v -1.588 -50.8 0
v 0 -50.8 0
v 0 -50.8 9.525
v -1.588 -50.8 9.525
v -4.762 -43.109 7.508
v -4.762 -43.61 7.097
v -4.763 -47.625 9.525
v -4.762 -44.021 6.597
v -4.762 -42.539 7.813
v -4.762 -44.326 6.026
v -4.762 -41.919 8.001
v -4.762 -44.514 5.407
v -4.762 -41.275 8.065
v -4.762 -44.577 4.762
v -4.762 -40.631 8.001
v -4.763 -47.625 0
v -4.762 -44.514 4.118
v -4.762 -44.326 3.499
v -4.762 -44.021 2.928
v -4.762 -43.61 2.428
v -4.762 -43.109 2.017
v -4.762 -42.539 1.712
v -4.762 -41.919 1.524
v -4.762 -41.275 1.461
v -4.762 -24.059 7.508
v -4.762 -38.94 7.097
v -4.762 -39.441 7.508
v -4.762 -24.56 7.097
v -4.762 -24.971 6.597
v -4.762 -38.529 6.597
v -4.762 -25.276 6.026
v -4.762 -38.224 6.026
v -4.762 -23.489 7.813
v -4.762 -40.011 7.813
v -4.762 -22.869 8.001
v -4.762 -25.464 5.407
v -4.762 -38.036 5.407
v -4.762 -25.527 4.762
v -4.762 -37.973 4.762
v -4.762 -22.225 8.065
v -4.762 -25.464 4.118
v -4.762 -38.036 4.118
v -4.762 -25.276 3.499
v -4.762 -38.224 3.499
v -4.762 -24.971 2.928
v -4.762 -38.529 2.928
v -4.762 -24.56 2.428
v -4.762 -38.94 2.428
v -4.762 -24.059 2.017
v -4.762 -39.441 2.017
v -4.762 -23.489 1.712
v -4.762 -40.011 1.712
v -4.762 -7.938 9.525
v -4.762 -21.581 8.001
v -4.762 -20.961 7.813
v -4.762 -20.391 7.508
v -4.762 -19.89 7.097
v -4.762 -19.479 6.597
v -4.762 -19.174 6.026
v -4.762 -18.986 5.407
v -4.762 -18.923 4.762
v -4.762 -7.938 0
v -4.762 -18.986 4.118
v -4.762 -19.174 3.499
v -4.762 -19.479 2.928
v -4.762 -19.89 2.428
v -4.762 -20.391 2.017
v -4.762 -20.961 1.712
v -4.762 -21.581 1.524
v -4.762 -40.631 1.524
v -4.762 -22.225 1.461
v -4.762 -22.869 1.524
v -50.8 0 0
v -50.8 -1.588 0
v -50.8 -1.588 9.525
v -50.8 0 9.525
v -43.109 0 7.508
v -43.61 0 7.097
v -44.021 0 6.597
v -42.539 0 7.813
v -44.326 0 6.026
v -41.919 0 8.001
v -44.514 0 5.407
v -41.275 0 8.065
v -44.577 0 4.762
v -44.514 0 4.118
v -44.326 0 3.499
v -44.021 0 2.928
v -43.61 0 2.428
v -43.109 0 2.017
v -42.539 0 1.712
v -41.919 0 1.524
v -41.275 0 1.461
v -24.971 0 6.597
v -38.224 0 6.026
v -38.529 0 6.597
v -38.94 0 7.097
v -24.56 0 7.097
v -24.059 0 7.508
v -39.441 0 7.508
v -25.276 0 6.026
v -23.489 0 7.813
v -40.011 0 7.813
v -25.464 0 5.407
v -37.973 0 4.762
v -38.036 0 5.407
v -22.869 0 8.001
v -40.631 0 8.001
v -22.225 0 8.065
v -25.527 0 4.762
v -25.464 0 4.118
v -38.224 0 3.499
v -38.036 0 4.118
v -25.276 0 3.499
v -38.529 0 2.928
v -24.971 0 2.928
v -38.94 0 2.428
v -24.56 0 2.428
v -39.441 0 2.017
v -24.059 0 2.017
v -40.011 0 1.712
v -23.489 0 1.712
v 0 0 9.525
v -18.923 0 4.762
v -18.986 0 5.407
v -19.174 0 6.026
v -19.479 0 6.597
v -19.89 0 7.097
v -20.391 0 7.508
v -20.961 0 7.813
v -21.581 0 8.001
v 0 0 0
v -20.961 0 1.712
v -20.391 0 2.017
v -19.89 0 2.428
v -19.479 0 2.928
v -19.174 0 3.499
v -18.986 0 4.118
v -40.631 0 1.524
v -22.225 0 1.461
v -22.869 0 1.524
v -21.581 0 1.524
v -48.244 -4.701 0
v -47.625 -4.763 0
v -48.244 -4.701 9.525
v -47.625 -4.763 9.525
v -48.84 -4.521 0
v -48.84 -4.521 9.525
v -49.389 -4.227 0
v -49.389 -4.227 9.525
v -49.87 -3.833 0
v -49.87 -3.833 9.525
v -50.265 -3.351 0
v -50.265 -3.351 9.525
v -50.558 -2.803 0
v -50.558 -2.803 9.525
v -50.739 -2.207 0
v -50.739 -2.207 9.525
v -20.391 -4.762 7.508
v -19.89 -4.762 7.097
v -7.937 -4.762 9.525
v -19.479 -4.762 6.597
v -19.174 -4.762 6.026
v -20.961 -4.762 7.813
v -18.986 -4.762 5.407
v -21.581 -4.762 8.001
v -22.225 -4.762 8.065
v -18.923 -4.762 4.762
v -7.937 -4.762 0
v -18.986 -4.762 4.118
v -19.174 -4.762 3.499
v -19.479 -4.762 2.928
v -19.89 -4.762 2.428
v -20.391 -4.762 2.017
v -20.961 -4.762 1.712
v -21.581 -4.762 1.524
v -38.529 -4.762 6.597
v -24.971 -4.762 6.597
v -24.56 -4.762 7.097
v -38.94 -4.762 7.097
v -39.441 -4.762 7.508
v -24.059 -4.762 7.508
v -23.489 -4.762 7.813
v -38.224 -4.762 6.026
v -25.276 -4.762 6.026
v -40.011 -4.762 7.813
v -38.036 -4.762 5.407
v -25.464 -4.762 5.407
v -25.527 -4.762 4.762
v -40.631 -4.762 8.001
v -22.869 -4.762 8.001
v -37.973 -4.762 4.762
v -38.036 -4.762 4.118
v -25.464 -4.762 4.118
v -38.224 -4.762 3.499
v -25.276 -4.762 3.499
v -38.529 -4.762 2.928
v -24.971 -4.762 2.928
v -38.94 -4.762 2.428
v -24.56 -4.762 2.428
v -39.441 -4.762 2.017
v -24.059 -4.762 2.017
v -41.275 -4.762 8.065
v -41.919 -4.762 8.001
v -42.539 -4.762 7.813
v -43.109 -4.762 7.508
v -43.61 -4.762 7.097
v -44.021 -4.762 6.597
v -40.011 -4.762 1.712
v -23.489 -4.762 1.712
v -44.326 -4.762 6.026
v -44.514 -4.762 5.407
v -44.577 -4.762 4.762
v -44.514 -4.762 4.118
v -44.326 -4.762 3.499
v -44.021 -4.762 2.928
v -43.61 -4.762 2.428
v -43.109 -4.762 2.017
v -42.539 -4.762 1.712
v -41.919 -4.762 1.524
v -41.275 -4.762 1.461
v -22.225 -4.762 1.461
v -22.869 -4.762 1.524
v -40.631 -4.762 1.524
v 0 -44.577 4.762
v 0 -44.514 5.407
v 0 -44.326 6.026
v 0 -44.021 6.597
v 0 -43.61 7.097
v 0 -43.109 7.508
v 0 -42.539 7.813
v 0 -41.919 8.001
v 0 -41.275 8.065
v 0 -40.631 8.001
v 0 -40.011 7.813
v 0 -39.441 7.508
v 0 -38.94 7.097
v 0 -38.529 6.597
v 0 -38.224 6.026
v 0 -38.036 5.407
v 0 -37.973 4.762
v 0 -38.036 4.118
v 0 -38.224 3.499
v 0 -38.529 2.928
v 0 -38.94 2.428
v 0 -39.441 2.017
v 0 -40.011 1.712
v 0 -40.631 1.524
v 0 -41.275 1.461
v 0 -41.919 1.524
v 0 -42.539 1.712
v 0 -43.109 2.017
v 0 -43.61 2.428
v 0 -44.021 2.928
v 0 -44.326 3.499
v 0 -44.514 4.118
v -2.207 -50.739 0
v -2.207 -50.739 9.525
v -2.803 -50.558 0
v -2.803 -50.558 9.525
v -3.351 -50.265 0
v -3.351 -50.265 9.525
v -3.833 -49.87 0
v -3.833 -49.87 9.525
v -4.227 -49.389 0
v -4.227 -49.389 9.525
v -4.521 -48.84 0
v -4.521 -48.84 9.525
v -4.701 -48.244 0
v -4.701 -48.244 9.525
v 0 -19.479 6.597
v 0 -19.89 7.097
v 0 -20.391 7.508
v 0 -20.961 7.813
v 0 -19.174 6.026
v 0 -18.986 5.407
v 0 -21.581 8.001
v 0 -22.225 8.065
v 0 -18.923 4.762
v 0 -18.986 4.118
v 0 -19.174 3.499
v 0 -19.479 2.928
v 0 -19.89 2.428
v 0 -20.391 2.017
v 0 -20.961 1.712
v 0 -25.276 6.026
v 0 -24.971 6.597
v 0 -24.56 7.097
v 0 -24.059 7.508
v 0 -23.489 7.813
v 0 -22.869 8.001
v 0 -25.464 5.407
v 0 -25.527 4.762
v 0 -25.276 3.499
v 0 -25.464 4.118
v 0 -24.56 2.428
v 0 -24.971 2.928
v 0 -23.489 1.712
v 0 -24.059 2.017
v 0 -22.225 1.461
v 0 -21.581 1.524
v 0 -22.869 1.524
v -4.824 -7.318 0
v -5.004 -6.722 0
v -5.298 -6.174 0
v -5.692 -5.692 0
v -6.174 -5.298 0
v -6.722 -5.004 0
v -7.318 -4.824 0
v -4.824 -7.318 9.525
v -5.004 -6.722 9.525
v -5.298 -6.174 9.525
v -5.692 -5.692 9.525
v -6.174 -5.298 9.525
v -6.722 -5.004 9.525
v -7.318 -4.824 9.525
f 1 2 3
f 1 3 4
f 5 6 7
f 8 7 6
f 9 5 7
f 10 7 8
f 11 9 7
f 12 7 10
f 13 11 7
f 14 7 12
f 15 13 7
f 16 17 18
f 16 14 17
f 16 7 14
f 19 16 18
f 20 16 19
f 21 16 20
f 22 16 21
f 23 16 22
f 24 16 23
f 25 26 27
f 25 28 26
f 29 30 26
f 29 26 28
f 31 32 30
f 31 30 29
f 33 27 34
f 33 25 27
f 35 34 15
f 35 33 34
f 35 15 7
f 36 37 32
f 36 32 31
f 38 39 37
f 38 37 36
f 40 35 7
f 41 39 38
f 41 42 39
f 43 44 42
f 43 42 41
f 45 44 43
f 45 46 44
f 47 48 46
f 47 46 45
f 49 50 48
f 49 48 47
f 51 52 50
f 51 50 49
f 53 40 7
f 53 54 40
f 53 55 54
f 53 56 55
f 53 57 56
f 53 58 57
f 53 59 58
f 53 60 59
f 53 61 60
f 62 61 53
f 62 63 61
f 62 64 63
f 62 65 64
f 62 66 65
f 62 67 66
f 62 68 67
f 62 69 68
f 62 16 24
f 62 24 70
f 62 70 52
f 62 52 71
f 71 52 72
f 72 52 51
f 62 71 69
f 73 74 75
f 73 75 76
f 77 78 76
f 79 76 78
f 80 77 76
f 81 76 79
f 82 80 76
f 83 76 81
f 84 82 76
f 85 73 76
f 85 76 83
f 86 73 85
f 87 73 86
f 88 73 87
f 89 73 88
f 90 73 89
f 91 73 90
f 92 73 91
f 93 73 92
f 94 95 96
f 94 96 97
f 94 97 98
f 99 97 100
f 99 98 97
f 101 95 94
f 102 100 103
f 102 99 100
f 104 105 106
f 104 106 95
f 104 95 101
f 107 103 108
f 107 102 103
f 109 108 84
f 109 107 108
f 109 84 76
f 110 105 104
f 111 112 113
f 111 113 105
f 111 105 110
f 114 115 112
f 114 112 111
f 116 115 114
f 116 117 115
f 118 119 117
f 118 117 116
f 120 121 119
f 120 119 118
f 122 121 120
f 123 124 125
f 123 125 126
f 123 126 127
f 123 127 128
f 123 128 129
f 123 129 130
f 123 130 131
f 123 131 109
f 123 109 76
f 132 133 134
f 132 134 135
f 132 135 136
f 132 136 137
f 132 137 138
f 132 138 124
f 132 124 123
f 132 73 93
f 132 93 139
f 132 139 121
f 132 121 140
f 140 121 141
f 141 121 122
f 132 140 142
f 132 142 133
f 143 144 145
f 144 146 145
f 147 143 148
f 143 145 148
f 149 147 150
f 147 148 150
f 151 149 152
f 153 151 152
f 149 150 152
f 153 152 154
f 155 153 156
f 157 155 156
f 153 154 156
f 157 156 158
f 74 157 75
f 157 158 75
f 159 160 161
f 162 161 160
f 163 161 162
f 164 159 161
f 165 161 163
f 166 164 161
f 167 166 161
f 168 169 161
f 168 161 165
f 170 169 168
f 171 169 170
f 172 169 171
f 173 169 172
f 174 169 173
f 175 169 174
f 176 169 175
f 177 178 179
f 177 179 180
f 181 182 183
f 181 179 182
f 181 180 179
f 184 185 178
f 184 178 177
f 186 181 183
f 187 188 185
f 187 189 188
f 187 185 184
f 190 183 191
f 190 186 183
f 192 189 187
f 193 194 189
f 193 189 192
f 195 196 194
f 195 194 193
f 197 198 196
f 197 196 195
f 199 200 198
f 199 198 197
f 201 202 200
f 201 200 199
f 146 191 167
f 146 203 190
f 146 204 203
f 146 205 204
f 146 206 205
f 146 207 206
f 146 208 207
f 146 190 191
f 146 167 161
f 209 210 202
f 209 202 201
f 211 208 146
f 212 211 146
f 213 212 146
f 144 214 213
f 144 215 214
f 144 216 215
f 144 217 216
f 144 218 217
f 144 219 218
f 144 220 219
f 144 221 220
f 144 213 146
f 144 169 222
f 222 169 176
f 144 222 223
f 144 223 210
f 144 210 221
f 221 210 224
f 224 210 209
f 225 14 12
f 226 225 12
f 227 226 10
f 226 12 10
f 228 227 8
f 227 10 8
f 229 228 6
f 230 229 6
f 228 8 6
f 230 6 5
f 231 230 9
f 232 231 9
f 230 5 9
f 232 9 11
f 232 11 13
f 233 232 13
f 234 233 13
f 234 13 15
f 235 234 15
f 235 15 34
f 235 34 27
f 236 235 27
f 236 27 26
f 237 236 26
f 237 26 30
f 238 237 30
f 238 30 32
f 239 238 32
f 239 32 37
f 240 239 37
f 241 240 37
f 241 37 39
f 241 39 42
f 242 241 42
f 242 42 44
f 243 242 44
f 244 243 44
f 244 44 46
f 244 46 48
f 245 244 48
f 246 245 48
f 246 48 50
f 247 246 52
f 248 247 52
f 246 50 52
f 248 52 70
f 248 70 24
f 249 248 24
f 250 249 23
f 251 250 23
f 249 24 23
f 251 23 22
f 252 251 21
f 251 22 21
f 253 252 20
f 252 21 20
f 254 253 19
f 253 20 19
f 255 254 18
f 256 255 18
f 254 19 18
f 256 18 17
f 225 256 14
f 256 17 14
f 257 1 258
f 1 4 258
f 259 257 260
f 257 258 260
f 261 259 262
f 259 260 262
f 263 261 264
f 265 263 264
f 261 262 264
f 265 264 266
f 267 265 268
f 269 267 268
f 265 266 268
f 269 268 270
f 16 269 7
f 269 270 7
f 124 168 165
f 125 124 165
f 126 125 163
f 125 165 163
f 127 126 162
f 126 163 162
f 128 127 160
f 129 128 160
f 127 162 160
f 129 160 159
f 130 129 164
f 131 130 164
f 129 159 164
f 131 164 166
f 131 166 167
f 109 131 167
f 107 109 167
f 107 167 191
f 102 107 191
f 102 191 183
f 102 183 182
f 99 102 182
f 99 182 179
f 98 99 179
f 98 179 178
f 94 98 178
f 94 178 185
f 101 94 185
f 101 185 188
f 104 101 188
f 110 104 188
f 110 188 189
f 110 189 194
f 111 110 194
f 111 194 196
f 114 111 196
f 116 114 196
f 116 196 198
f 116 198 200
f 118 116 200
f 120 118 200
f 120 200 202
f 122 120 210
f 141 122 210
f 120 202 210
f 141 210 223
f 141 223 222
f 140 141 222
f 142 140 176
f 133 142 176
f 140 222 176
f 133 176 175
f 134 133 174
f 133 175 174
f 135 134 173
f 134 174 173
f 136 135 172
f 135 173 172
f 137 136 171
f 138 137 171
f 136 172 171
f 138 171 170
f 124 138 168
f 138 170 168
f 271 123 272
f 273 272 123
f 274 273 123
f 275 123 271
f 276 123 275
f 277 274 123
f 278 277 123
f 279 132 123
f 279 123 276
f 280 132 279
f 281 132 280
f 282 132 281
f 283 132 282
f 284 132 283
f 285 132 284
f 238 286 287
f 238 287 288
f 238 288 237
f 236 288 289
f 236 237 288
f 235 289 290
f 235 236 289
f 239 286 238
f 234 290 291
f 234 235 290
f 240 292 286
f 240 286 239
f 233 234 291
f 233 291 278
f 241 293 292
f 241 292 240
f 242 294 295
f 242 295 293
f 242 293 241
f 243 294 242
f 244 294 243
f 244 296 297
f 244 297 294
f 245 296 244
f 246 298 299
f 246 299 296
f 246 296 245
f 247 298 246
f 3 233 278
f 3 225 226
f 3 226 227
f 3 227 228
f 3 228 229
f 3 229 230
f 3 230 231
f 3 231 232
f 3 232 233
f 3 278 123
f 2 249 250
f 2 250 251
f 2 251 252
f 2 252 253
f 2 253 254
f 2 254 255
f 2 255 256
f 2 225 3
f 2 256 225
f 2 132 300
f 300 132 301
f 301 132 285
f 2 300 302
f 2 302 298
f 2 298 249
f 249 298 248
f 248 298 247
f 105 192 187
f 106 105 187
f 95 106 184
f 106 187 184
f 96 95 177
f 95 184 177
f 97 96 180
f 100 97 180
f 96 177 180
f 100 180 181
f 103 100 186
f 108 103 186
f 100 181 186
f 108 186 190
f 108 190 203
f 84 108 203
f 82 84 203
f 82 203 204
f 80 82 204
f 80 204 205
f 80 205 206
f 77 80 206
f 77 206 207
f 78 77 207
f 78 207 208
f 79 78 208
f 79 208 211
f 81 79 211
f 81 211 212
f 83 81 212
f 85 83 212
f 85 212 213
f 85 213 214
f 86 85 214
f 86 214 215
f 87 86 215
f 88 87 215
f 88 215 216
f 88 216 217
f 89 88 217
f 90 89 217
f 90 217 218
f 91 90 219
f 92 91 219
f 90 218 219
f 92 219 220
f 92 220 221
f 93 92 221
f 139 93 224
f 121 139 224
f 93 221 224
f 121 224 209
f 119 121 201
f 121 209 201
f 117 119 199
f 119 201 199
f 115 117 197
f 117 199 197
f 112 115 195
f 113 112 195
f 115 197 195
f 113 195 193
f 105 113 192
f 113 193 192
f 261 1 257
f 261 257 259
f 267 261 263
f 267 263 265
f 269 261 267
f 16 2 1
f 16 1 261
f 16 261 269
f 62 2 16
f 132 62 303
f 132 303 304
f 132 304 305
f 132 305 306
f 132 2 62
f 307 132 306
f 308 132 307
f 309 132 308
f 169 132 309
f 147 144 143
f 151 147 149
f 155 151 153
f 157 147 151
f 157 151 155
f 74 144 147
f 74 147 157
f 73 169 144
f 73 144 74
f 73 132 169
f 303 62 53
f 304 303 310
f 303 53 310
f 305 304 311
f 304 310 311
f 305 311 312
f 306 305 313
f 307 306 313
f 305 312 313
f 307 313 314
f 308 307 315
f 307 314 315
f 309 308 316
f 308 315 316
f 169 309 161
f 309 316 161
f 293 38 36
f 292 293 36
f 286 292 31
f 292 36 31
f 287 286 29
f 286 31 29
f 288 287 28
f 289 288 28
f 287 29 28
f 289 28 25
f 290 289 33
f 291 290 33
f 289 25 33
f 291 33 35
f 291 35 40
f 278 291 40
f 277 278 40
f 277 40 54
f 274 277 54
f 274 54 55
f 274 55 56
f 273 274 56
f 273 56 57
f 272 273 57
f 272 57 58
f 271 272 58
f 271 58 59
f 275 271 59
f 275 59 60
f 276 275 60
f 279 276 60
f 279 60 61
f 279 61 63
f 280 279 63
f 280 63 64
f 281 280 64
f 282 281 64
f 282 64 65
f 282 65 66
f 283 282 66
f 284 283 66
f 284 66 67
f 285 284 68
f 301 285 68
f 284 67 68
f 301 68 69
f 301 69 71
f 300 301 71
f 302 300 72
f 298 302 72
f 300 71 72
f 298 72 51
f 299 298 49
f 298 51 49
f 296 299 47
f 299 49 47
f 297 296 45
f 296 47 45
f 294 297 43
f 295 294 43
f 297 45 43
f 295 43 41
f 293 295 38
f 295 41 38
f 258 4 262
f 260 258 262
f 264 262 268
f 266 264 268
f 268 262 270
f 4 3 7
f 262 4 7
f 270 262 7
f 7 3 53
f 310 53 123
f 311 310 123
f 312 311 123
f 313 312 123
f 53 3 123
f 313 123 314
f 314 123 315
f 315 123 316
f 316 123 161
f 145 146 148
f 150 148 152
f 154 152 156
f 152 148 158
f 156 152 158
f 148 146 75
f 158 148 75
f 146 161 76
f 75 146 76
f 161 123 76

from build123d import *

# Parameters (mm, degrees)
BOSS_EXTRUDE1_DEPTH = 9.525
FILLET1_R           = 3.175
SKETCH2_R           = 3.302
CUT_EXTRUDE1_DEPTH  = 70.215728207
SKETCH3_R           = 3.302
CUT_EXTRUDE2_DEPTH  = 70.215728207


with BuildPart() as part:
    # Sketch1 → Boss-Extrude1 (new body)
    with BuildSketch(Plane.XY):
        Polygon((-50.8, 0), (0, 0), (0, -50.8), (-4.7625, -50.8), (-4.7625, -4.7625), (-50.8, -4.7625), align=None)
    extrude(amount=BOSS_EXTRUDE1_DEPTH)

    # Fillet1
    fillet1_edges = [part.edges().sort_by_distance(p)[0] for p in [
        (-4.7625, -50.8, 4.7625),
        (-4.7625, -4.7625, 4.7625),
        (-50.8, -4.7625, 4.7625),
    ]]
    fillet(fillet1_edges, radius=FILLET1_R)

    # Sketch2 → Cut-Extrude1 (cut, through all)
    with BuildSketch(Plane.ZY.offset(4.7625)):
        with Locations(Location((4.7625, -41.275, 0), (0, 0, 270))):
            Circle(SKETCH2_R)
        with Locations(Location((4.7625, -22.225, 0), (0, 0, 270))):
            Circle(SKETCH2_R)
    extrude(amount=-CUT_EXTRUDE1_DEPTH, mode=Mode.SUBTRACT)

    # Sketch3 → Cut-Extrude2 (cut, through all)
    with BuildSketch(Plane.XZ.offset(4.7625)):
        with Locations((-41.275, 4.7625)):
            Circle(SKETCH3_R)
        with Locations((-22.225, 4.7625)):
            Circle(SKETCH3_R)
    extrude(amount=-CUT_EXTRUDE2_DEPTH, mode=Mode.SUBTRACT)


solid = part.part
